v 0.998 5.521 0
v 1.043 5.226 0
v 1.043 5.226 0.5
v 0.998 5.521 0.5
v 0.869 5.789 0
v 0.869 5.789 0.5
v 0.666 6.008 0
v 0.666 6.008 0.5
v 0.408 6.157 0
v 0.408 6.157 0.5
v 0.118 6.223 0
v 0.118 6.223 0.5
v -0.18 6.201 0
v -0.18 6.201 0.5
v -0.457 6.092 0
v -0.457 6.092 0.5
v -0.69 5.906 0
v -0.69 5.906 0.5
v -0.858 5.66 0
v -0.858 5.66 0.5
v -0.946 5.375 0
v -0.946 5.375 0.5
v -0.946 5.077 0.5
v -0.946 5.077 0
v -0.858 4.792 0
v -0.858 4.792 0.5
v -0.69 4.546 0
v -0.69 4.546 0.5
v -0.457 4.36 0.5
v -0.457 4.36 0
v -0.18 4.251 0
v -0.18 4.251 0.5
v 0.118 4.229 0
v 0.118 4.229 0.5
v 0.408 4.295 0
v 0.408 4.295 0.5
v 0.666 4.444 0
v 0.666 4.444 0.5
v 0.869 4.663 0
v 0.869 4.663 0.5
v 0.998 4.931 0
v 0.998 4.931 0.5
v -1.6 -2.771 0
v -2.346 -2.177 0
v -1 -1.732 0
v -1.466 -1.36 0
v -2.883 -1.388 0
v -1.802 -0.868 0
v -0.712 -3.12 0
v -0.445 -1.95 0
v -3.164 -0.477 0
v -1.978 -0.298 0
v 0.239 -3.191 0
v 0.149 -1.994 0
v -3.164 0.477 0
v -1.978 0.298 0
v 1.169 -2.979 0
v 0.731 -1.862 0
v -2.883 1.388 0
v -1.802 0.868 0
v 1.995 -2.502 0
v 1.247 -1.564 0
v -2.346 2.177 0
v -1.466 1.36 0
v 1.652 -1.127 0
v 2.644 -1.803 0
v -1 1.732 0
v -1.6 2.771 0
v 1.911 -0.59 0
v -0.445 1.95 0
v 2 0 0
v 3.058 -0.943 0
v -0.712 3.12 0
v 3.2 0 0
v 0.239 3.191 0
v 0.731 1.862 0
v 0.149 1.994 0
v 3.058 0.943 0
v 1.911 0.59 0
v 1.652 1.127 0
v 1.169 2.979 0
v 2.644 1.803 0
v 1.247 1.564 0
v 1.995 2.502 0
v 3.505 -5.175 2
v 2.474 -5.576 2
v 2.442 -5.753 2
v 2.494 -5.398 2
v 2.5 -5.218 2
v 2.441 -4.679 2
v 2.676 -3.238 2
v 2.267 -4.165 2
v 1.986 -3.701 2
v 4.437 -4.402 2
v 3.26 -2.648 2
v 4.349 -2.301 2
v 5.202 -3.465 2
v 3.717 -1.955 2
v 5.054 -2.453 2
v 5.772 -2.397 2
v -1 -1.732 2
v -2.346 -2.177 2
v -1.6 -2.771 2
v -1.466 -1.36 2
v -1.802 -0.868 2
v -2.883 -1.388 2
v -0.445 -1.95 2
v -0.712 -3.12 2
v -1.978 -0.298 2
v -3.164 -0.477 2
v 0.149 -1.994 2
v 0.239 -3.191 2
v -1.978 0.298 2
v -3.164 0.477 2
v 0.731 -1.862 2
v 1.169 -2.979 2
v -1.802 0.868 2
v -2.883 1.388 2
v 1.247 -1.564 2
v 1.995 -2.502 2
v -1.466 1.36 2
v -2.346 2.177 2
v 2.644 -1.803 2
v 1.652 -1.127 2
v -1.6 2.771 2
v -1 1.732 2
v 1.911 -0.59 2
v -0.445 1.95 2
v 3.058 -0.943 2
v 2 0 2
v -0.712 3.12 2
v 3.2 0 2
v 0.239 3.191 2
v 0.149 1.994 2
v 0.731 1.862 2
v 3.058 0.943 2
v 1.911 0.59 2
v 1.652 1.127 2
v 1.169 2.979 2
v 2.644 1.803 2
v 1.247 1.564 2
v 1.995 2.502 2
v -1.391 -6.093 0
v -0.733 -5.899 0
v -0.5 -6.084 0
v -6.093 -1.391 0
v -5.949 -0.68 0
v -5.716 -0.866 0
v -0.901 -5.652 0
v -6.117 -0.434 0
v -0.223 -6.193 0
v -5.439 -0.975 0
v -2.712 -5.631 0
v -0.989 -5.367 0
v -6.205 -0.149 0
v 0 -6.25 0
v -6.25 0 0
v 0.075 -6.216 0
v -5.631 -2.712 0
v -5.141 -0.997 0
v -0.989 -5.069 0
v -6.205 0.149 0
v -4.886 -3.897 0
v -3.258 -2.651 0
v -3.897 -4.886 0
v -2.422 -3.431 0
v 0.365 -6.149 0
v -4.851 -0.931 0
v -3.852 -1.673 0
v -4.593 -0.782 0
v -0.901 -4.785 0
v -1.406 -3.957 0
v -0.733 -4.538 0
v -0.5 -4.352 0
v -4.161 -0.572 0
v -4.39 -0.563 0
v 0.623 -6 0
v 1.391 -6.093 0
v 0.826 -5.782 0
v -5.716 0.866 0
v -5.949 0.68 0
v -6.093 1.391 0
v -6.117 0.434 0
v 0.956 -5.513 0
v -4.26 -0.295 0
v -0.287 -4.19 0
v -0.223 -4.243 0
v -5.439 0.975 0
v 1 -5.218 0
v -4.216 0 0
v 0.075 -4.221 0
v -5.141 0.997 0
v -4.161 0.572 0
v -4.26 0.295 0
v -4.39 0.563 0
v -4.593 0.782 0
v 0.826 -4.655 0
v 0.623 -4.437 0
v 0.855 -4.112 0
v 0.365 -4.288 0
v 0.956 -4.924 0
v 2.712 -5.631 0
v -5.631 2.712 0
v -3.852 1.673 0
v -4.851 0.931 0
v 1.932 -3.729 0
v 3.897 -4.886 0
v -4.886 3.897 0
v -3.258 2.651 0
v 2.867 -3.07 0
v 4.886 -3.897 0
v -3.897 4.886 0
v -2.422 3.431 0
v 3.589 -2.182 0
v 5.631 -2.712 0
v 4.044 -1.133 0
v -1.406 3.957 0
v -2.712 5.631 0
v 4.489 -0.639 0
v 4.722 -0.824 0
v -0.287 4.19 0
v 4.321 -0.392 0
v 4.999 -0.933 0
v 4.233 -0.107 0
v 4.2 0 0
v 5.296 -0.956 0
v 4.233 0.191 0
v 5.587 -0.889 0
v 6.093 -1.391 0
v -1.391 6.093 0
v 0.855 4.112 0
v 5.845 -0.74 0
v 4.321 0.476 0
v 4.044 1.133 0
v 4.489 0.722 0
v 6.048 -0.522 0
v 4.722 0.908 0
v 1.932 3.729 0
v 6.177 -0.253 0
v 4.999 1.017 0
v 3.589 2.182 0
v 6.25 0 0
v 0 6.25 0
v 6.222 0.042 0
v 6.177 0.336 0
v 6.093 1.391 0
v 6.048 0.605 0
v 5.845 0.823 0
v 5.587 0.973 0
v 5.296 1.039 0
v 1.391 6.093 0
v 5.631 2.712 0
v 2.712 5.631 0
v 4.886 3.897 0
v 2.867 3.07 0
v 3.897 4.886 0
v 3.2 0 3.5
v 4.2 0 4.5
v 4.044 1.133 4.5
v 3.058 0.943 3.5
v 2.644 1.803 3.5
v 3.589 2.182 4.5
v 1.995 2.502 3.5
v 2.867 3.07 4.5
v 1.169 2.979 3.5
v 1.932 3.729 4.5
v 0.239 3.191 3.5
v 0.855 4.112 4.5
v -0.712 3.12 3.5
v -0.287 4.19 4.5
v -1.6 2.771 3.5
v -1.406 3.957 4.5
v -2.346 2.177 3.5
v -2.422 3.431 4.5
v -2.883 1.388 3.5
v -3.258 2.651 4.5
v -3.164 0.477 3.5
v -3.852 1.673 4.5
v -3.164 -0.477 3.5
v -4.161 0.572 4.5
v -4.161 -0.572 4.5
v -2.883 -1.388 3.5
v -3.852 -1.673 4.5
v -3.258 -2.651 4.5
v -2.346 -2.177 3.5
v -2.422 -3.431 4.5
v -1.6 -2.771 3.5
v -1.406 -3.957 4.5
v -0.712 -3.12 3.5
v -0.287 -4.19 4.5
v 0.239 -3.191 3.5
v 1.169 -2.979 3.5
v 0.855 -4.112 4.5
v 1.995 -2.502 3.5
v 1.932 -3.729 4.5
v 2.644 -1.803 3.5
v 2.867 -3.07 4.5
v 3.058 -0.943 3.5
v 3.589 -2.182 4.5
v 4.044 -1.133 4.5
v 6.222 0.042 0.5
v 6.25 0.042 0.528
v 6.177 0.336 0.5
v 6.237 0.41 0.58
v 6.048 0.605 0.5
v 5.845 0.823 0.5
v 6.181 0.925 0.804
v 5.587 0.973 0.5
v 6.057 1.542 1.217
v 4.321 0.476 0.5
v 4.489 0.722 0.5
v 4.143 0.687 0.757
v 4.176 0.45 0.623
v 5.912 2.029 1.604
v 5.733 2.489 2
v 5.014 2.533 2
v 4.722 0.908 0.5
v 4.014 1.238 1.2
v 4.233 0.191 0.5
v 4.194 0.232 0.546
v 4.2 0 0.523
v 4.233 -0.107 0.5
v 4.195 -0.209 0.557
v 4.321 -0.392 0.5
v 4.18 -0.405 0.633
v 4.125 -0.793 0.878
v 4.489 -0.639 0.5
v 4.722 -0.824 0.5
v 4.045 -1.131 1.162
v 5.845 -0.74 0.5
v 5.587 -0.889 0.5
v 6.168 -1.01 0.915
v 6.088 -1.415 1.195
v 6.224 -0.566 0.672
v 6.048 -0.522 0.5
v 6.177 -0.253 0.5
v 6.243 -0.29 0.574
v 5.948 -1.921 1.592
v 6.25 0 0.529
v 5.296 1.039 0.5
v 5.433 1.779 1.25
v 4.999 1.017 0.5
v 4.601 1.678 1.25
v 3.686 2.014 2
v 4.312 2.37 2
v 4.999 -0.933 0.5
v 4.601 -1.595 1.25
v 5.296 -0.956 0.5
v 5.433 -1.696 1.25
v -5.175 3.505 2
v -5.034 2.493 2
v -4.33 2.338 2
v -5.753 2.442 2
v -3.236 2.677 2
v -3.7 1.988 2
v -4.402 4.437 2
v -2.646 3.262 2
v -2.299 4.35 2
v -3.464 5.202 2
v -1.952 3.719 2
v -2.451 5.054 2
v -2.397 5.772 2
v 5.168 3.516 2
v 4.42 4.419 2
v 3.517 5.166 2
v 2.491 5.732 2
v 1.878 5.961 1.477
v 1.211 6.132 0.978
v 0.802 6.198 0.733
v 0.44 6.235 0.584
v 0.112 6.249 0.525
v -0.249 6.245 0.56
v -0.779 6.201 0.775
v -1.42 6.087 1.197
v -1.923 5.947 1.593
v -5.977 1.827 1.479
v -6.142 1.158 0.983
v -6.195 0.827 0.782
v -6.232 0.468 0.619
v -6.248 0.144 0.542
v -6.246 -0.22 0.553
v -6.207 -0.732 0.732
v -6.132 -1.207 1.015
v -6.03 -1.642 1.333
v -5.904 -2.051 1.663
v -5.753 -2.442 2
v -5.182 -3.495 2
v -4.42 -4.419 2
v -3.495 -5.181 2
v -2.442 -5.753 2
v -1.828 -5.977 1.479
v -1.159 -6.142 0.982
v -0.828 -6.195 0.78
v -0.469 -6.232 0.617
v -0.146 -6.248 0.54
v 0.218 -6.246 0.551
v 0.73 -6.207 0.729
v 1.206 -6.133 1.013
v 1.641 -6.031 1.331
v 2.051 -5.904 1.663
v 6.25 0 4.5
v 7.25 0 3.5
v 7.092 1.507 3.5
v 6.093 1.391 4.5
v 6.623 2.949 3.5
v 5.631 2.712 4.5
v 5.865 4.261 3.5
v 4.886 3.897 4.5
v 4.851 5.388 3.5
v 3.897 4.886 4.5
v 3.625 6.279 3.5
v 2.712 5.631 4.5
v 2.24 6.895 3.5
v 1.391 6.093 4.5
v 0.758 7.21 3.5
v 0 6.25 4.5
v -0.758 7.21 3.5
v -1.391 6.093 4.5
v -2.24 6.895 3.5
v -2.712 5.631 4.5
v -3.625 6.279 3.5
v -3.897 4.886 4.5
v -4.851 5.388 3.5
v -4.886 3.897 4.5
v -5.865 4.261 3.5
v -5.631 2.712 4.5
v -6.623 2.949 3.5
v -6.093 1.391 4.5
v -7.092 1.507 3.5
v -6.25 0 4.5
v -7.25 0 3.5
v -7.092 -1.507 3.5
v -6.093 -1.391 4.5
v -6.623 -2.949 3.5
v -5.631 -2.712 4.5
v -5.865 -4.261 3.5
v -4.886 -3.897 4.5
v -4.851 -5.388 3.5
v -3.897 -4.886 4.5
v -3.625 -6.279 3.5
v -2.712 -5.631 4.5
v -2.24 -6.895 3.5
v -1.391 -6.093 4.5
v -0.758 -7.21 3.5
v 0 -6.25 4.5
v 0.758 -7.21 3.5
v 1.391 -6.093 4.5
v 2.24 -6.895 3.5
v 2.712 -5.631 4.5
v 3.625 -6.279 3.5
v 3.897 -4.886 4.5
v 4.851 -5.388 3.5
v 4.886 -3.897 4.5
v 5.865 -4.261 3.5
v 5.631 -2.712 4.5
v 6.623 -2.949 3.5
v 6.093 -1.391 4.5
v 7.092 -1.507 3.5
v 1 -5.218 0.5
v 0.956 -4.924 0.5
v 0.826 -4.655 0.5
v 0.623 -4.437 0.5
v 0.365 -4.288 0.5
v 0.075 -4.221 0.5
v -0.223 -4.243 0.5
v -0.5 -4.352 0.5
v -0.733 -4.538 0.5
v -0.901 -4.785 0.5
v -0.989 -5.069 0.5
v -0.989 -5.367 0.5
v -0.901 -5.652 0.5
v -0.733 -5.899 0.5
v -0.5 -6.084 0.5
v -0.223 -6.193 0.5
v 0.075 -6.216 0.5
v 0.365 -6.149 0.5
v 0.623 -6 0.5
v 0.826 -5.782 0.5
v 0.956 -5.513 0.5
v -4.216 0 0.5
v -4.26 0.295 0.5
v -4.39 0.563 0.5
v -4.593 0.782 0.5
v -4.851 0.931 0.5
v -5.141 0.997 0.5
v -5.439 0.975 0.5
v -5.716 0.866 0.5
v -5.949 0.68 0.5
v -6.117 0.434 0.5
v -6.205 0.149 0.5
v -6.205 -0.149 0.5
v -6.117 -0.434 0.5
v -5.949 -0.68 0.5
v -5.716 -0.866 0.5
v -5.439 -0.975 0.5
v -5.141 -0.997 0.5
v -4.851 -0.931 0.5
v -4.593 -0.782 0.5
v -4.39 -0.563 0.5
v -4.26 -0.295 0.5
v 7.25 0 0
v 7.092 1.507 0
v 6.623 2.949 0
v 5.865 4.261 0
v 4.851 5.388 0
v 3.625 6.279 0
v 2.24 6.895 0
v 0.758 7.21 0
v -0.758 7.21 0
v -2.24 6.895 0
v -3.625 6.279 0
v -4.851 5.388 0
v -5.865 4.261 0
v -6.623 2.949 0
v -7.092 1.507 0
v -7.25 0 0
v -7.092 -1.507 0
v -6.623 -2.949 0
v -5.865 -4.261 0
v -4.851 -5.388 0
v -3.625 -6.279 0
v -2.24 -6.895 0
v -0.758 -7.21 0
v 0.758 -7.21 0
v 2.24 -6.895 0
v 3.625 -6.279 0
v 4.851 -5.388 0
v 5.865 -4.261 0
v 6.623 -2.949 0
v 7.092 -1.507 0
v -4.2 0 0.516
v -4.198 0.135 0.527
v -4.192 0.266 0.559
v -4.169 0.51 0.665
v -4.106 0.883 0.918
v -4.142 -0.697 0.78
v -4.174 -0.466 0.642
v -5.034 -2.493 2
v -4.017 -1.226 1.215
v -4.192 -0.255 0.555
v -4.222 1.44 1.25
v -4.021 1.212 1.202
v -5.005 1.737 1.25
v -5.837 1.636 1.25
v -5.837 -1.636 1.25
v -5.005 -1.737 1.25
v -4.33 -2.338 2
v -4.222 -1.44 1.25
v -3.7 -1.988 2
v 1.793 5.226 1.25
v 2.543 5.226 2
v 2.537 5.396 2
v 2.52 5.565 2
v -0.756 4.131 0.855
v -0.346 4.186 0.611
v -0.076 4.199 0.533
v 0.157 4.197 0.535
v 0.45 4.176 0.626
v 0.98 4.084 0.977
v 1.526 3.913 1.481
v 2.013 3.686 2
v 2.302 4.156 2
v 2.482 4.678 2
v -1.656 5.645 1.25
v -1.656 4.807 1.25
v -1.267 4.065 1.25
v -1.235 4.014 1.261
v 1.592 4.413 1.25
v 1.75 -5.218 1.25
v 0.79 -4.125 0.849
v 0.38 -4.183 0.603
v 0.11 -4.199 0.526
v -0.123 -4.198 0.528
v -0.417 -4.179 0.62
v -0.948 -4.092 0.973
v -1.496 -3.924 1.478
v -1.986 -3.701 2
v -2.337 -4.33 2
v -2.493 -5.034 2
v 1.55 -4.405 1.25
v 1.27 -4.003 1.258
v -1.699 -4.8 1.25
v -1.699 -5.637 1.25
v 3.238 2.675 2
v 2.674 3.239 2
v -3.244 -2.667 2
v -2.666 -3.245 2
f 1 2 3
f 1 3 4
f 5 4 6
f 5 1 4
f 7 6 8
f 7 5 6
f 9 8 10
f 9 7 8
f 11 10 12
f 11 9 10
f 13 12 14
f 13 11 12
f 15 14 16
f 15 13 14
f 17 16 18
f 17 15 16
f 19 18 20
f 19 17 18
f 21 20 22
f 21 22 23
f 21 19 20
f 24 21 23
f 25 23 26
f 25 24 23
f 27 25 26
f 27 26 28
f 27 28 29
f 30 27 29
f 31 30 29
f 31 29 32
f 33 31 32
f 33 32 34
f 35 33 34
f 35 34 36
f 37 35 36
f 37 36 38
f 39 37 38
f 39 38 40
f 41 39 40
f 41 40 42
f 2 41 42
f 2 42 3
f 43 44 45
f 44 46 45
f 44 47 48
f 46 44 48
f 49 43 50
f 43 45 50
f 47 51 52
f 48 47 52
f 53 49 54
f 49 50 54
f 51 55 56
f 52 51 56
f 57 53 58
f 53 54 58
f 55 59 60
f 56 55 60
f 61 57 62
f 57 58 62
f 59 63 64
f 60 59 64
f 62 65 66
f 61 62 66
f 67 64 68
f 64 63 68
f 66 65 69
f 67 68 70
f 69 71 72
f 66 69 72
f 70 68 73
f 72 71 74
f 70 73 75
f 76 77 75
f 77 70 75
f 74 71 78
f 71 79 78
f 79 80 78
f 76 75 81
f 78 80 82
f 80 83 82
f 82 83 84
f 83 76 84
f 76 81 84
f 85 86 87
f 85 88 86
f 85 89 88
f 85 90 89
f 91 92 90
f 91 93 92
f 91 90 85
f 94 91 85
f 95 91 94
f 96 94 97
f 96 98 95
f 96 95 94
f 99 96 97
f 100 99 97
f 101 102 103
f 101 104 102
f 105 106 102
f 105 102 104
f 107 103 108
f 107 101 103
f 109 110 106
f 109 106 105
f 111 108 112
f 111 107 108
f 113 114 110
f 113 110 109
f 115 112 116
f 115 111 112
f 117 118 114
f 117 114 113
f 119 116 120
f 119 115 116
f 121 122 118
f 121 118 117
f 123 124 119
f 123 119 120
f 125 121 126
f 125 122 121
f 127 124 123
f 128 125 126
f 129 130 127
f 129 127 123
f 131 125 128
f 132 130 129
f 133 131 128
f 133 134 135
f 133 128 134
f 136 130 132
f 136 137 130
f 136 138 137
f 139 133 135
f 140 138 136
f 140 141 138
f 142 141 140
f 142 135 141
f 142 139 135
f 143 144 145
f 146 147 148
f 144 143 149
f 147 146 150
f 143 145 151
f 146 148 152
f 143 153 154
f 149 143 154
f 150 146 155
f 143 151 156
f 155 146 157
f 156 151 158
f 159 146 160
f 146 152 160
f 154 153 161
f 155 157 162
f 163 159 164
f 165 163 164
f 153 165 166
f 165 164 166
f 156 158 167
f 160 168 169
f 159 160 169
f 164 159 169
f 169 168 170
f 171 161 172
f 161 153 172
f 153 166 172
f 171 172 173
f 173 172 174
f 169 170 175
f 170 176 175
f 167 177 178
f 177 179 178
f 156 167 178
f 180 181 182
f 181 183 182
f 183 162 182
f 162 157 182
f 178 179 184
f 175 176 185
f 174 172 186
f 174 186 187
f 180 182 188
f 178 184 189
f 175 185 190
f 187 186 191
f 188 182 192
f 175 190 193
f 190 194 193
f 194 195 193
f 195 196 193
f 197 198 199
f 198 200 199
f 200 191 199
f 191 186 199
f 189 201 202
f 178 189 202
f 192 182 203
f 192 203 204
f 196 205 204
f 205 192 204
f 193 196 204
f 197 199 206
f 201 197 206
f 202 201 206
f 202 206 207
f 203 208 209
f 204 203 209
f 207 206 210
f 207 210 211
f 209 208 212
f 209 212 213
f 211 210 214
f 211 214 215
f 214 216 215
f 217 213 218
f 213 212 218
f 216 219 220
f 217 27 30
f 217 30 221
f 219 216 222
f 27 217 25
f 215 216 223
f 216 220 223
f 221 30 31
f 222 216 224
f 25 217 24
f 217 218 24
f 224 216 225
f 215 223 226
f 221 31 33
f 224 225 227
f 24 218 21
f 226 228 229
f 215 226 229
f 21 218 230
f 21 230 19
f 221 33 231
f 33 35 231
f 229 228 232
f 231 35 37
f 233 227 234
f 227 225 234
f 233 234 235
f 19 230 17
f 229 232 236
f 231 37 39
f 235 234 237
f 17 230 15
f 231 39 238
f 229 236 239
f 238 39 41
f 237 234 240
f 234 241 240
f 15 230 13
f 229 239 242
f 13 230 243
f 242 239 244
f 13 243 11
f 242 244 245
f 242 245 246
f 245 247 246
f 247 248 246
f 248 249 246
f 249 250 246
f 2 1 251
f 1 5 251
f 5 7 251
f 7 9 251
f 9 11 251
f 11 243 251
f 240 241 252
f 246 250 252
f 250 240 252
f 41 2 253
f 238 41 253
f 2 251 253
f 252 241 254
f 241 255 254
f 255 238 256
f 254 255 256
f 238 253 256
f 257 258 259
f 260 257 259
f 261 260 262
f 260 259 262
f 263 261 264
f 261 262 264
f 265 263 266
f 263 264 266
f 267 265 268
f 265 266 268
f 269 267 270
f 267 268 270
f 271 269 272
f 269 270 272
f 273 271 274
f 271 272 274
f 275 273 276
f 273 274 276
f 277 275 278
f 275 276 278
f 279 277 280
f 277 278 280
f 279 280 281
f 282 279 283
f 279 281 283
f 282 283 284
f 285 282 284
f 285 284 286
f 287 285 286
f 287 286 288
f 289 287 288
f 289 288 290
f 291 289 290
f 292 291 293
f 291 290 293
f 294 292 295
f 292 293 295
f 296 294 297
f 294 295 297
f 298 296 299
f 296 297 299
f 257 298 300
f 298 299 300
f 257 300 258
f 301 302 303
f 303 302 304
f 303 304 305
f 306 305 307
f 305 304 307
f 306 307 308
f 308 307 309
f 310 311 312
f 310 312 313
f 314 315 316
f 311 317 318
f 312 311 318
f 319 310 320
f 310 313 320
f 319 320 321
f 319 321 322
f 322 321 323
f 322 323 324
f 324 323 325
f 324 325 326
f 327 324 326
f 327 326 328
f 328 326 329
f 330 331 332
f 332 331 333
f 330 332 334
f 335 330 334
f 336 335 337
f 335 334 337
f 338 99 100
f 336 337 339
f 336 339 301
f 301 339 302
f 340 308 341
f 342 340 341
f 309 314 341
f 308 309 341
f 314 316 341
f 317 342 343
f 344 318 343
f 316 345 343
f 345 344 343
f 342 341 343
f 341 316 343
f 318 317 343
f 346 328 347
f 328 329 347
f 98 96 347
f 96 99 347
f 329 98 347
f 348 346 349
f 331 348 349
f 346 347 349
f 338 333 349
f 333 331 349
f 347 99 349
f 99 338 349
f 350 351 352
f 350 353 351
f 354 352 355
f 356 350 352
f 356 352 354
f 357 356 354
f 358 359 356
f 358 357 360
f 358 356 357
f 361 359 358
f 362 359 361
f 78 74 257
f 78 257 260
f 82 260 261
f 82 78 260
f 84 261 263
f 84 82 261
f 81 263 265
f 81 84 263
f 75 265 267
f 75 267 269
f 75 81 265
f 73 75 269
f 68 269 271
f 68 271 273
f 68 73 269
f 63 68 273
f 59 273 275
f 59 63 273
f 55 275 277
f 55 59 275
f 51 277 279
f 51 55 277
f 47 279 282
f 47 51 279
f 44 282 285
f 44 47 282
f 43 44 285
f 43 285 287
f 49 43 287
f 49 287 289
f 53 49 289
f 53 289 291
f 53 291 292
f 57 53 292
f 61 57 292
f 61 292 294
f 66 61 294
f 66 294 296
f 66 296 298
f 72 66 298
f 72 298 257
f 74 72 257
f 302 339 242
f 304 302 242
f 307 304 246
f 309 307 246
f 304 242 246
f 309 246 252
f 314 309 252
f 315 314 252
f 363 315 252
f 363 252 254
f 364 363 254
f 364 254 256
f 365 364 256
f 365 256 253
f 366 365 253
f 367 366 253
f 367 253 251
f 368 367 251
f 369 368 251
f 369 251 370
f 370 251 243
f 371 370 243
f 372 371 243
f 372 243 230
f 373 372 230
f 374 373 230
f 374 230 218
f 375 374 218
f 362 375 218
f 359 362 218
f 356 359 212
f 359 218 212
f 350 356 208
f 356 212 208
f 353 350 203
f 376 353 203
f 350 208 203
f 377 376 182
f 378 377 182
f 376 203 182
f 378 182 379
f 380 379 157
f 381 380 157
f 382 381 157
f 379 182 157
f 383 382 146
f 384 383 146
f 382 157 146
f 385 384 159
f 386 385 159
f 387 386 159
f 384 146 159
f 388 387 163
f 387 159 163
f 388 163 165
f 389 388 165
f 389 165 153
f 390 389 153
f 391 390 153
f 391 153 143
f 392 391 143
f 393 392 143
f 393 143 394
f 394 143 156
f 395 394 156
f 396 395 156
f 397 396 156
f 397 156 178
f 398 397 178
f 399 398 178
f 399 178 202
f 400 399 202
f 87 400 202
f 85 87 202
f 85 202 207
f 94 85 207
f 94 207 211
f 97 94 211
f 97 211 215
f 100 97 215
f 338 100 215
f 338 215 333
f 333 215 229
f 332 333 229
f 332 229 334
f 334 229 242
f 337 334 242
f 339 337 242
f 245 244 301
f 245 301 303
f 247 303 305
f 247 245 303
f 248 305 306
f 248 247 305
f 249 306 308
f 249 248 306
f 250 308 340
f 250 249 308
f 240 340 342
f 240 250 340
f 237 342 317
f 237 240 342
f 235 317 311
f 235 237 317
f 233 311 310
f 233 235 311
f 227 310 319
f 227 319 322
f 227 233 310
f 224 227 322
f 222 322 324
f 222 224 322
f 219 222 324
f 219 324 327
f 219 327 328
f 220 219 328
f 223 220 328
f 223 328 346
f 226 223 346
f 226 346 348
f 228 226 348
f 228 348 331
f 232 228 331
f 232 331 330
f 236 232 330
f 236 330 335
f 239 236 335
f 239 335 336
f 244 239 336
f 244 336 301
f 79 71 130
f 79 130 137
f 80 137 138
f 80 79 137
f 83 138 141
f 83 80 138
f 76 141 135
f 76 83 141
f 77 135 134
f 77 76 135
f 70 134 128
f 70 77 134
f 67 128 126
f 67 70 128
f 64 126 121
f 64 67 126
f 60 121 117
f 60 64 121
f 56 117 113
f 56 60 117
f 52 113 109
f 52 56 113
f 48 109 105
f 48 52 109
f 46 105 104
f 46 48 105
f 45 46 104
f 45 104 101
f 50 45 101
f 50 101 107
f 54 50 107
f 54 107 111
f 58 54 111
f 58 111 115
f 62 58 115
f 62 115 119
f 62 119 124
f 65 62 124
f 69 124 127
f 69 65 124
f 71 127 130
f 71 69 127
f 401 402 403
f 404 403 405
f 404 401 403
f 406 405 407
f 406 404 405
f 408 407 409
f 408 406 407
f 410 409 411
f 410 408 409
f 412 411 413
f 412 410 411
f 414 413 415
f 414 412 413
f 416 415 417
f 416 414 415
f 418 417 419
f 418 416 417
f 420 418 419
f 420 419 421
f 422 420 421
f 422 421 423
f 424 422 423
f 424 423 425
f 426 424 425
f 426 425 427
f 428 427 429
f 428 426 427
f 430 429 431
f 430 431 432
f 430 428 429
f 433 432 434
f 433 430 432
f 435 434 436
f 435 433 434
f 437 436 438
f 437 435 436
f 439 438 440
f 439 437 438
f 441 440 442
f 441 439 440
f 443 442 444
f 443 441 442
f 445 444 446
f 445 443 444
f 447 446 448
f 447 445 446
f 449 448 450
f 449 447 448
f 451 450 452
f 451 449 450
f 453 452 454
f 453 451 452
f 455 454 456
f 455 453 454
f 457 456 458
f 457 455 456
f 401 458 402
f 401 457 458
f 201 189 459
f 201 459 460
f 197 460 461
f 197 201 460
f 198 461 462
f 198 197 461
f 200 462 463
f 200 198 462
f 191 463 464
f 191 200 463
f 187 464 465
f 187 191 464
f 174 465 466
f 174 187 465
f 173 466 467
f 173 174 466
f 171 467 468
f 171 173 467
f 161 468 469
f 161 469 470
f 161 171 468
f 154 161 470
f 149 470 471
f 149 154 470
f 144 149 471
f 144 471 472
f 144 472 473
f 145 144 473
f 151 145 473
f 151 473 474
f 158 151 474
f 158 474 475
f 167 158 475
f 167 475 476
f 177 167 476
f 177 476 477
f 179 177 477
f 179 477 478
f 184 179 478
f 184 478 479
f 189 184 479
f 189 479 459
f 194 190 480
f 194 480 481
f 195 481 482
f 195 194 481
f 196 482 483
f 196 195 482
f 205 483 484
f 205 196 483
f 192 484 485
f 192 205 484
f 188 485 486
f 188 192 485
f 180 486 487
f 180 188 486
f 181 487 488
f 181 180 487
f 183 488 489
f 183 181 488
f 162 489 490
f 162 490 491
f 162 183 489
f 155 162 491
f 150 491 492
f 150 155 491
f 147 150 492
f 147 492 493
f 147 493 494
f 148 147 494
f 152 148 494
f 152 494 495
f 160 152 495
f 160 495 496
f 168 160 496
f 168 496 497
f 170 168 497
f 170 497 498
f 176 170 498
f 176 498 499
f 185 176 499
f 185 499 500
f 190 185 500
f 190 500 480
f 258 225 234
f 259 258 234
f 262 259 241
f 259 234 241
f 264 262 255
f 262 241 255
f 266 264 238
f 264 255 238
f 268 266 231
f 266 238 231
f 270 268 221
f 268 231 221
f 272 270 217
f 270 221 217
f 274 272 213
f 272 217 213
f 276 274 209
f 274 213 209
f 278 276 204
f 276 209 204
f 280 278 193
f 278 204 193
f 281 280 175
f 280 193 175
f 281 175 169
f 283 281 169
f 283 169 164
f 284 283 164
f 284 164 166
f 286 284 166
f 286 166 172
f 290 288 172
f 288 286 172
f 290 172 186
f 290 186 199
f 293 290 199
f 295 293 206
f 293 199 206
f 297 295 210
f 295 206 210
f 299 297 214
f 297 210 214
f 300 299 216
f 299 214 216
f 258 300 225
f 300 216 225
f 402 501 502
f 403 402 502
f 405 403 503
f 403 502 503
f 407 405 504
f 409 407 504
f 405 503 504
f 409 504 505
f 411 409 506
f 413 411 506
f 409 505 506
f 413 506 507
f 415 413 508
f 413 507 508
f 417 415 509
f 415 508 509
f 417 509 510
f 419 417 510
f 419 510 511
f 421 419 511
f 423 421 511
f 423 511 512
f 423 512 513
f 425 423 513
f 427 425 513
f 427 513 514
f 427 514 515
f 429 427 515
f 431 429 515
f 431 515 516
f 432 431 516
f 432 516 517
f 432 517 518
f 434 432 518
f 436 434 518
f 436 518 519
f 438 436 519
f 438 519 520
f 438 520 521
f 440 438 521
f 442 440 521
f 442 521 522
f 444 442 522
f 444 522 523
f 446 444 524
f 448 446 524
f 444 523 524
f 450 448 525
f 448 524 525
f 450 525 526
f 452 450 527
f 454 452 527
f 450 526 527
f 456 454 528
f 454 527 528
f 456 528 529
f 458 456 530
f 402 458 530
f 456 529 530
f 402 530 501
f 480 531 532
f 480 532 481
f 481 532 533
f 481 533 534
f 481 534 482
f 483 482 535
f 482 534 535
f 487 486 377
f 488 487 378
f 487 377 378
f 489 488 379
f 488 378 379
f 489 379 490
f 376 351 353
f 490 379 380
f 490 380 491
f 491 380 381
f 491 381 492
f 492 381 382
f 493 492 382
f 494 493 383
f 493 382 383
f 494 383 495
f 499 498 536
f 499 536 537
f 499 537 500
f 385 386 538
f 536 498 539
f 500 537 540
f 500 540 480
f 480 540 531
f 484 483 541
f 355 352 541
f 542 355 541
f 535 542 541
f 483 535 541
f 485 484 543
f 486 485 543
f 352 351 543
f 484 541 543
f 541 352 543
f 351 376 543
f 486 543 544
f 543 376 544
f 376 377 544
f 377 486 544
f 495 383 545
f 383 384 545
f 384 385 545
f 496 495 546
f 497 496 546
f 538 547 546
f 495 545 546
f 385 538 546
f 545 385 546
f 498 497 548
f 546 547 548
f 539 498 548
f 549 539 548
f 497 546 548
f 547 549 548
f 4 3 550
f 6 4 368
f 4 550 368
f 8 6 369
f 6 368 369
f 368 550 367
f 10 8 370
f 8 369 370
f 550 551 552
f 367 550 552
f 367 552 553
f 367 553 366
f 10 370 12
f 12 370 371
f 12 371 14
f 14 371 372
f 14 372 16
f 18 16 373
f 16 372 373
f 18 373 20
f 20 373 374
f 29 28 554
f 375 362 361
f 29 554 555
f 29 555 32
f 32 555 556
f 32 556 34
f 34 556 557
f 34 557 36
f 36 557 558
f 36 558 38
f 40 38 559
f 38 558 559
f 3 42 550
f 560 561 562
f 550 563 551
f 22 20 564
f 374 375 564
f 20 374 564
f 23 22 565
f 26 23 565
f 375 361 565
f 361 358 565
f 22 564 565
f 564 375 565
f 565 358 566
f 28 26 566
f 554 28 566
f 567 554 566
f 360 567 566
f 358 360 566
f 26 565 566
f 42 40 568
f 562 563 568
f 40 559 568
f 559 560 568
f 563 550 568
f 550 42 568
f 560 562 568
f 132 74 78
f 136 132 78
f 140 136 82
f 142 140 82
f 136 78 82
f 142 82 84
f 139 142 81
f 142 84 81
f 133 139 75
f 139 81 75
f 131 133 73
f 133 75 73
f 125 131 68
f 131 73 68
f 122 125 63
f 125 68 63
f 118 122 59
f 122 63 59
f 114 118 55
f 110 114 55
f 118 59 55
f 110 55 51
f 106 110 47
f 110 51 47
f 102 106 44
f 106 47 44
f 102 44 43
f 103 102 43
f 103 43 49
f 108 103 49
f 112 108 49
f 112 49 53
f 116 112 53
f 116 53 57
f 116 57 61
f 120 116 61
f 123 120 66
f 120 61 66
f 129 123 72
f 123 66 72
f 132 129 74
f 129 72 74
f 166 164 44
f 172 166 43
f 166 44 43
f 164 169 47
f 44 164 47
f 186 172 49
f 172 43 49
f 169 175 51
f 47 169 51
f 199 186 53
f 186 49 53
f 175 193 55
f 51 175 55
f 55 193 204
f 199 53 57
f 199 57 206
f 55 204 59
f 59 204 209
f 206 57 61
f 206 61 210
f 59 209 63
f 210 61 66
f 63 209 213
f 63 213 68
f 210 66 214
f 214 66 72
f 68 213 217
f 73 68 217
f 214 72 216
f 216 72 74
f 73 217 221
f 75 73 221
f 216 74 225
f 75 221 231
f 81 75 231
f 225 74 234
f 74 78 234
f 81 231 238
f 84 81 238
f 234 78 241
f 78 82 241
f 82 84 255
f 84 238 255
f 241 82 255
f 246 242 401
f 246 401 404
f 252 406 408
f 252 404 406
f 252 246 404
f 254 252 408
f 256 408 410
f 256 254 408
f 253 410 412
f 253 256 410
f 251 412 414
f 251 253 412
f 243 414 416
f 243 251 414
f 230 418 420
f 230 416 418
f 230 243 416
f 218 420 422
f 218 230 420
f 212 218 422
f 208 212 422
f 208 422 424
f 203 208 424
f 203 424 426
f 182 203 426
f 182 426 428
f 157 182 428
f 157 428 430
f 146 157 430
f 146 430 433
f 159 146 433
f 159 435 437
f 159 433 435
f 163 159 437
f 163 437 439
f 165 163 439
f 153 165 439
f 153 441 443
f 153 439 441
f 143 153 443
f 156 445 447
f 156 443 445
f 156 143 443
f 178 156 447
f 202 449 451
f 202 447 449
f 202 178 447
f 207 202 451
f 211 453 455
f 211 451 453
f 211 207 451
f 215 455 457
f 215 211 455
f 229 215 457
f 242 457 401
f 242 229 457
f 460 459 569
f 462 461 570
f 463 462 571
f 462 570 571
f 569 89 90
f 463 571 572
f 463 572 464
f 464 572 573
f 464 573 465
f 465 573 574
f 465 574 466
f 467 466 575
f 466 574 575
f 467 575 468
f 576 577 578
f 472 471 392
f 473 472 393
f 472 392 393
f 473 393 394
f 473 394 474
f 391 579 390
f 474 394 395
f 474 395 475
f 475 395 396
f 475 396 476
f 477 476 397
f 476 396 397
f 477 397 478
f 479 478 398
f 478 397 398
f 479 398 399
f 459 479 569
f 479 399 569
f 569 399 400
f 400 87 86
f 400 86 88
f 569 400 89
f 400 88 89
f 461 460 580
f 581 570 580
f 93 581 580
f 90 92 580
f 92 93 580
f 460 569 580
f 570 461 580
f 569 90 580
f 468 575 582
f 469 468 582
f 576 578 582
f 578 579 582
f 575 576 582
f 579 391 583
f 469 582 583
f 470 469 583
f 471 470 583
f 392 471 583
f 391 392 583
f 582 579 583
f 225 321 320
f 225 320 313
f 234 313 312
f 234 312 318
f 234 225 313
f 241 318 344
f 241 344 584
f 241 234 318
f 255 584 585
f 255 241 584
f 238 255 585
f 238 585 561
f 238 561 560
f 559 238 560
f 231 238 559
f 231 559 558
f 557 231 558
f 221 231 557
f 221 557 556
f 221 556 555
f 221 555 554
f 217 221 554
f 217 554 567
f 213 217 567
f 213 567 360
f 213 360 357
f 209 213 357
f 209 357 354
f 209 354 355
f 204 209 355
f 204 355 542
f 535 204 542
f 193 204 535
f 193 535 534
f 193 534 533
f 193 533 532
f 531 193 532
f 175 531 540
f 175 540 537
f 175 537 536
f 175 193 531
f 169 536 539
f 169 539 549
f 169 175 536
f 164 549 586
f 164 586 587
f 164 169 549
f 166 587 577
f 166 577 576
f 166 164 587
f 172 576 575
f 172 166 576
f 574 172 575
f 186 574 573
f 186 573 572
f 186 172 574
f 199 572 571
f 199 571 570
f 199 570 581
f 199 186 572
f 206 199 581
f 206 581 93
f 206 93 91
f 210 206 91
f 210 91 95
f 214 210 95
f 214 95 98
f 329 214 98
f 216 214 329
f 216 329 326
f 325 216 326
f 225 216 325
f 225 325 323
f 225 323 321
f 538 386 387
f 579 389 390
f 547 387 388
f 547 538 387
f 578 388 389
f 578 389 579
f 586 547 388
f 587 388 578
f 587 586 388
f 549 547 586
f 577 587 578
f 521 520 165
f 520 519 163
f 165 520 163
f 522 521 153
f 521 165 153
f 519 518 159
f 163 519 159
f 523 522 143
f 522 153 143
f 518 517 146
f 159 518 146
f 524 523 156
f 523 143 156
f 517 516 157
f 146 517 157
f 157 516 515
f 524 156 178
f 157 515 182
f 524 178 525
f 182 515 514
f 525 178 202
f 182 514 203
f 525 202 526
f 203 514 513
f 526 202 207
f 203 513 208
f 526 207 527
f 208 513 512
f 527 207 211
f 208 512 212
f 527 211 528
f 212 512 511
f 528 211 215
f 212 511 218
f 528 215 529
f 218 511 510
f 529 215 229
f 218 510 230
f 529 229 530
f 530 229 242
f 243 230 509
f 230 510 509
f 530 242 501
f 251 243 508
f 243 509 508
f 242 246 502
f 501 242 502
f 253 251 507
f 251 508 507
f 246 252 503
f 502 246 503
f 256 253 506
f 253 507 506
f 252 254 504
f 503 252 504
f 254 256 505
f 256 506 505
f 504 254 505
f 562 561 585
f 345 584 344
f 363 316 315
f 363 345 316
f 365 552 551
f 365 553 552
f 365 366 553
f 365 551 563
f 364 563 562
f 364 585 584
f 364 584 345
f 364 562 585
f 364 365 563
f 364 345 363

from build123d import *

# Parameters (mm, degrees)
F0_R     = 7.25
F0_R_2   = 6.25
F1_DEPTH = 5
F0_R_3   = 4.2
F0_R_4   = 3.2
F0_R_5   = 2
F2_DEPTH = 2
F0_R_6   = 1


# Not quite as in the source:
# - a fillet or chamfer that OpenCascade refuses, or shapes differently, is made with other operations: its cross-section is extruded or revolved along the edge and cut away or added


with BuildPart() as f1:
    # F0 (on Top) → F1 (new body)
    with BuildSketch(Plane.XY):
        Circle(F0_R)
        Circle(F0_R_2, mode=Mode.SUBTRACT)
    extrude(amount=F1_DEPTH)

    # F3#3: chamfer of 1.5 on 1 edges, made by hand

    # F3_3_s1 → F3_3_t2 (revolve, cut)
    with BuildSketch(Plane.XZ):
        Polygon((7.25, 3.5), (5.75, 5), (7.25, 5), align=None)
    revolve(axis=Axis((0, 0, 5), (0, 0, 1)), mode=Mode.SUBTRACT)


with BuildPart() as f1b:
    # F0 (on Top) → F1, piece 2 (new body)
    with BuildSketch(Plane.XY):
        Circle(F0_R_3)
        Circle(F0_R_4, mode=Mode.SUBTRACT)
    extrude(amount=F1_DEPTH)

    # F3#2: chamfer of 1.5 on 1 edges, made by hand

    # F3_2_s1 → F3_2_t2 (revolve, cut)
    with BuildSketch(Plane.XZ):
        Polygon((3.2, 3.5), (4.7, 5), (3.2, 5), align=None)
    revolve(axis=Axis((0, 0, 5), (0, 0, 1)), mode=Mode.SUBTRACT)


with BuildPart() as f2:
    # F0 (on Top) → F2 (new body)
    with BuildSketch(Plane.XY):
        Circle(F0_R_4)
        Circle(F0_R_5, mode=Mode.SUBTRACT)
    extrude(amount=F2_DEPTH)


with BuildPart() as f2b:
    # F0 (on Top) → F2, piece 2 (new body)
    with BuildSketch(Plane.XY):
        Circle(F0_R_2)
        with Locations((0, -5.2184178494)):
            Circle(F0_R_6, mode=Mode.SUBTRACT)
        with Locations((-5.2160057239, 0)):
            Circle(F0_R_6, mode=Mode.SUBTRACT)
        Circle(F0_R_3, mode=Mode.SUBTRACT)
        with Locations((5.2217580378, 0.0416360635)):
            Circle(F0_R_6, mode=Mode.SUBTRACT)
        with Locations((0.0427705018, 5.2258885844)):
            Circle(F0_R_6, mode=Mode.SUBTRACT)
    extrude(amount=F2_DEPTH)

    # F3: chamfer of 1.5 on 4 edges, made by hand

    # F3_s1 → F3_t2 (revolve, cut)
    with BuildSketch(Plane.XZ):
        Polygon((-4.2160057239, 0.5), (-2.7160057239, 2), (-4.2160057239, 2), align=None)
    revolve(axis=Axis((-5.2160057239, 0, 2), (0, 0, 1)), mode=Mode.SUBTRACT)

    # F3_s3 → F3_t4 (revolve, cut)
    with BuildSketch(Plane.XZ.offset(5.2184178494)):
        Polygon((1, 0.5), (2.5, 2), (1, 2), align=None)
    revolve(axis=Axis((0, -5.2184178494, 2), (0, 0, 1)), mode=Mode.SUBTRACT)

    # F3_s5 → F3_t6 (revolve, cut)
    with BuildSketch(Plane.XZ.offset(-5.2258885844)):
        Polygon((1.0427705018, 0.5), (2.5427705018, 2), (1.0427705018, 2), align=None)
    revolve(axis=Axis((0.0427705018, 5.2258885844, 2), (0, 0, 1)), mode=Mode.SUBTRACT)

    # F3_s7 → F3_t8 (revolve, cut)
    with BuildSketch(Plane.XZ.offset(-0.0416360635)):
        Polygon((6.2217580378, 0.5), (7.7217580378, 2), (6.2217580378, 2), align=None)
    revolve(axis=Axis((5.2217580378, 0.0416360635, 2), (0, 0, 1)), mode=Mode.SUBTRACT)


solid = Compound([f1.part, f1b.part, f2.part, f2b.part])
